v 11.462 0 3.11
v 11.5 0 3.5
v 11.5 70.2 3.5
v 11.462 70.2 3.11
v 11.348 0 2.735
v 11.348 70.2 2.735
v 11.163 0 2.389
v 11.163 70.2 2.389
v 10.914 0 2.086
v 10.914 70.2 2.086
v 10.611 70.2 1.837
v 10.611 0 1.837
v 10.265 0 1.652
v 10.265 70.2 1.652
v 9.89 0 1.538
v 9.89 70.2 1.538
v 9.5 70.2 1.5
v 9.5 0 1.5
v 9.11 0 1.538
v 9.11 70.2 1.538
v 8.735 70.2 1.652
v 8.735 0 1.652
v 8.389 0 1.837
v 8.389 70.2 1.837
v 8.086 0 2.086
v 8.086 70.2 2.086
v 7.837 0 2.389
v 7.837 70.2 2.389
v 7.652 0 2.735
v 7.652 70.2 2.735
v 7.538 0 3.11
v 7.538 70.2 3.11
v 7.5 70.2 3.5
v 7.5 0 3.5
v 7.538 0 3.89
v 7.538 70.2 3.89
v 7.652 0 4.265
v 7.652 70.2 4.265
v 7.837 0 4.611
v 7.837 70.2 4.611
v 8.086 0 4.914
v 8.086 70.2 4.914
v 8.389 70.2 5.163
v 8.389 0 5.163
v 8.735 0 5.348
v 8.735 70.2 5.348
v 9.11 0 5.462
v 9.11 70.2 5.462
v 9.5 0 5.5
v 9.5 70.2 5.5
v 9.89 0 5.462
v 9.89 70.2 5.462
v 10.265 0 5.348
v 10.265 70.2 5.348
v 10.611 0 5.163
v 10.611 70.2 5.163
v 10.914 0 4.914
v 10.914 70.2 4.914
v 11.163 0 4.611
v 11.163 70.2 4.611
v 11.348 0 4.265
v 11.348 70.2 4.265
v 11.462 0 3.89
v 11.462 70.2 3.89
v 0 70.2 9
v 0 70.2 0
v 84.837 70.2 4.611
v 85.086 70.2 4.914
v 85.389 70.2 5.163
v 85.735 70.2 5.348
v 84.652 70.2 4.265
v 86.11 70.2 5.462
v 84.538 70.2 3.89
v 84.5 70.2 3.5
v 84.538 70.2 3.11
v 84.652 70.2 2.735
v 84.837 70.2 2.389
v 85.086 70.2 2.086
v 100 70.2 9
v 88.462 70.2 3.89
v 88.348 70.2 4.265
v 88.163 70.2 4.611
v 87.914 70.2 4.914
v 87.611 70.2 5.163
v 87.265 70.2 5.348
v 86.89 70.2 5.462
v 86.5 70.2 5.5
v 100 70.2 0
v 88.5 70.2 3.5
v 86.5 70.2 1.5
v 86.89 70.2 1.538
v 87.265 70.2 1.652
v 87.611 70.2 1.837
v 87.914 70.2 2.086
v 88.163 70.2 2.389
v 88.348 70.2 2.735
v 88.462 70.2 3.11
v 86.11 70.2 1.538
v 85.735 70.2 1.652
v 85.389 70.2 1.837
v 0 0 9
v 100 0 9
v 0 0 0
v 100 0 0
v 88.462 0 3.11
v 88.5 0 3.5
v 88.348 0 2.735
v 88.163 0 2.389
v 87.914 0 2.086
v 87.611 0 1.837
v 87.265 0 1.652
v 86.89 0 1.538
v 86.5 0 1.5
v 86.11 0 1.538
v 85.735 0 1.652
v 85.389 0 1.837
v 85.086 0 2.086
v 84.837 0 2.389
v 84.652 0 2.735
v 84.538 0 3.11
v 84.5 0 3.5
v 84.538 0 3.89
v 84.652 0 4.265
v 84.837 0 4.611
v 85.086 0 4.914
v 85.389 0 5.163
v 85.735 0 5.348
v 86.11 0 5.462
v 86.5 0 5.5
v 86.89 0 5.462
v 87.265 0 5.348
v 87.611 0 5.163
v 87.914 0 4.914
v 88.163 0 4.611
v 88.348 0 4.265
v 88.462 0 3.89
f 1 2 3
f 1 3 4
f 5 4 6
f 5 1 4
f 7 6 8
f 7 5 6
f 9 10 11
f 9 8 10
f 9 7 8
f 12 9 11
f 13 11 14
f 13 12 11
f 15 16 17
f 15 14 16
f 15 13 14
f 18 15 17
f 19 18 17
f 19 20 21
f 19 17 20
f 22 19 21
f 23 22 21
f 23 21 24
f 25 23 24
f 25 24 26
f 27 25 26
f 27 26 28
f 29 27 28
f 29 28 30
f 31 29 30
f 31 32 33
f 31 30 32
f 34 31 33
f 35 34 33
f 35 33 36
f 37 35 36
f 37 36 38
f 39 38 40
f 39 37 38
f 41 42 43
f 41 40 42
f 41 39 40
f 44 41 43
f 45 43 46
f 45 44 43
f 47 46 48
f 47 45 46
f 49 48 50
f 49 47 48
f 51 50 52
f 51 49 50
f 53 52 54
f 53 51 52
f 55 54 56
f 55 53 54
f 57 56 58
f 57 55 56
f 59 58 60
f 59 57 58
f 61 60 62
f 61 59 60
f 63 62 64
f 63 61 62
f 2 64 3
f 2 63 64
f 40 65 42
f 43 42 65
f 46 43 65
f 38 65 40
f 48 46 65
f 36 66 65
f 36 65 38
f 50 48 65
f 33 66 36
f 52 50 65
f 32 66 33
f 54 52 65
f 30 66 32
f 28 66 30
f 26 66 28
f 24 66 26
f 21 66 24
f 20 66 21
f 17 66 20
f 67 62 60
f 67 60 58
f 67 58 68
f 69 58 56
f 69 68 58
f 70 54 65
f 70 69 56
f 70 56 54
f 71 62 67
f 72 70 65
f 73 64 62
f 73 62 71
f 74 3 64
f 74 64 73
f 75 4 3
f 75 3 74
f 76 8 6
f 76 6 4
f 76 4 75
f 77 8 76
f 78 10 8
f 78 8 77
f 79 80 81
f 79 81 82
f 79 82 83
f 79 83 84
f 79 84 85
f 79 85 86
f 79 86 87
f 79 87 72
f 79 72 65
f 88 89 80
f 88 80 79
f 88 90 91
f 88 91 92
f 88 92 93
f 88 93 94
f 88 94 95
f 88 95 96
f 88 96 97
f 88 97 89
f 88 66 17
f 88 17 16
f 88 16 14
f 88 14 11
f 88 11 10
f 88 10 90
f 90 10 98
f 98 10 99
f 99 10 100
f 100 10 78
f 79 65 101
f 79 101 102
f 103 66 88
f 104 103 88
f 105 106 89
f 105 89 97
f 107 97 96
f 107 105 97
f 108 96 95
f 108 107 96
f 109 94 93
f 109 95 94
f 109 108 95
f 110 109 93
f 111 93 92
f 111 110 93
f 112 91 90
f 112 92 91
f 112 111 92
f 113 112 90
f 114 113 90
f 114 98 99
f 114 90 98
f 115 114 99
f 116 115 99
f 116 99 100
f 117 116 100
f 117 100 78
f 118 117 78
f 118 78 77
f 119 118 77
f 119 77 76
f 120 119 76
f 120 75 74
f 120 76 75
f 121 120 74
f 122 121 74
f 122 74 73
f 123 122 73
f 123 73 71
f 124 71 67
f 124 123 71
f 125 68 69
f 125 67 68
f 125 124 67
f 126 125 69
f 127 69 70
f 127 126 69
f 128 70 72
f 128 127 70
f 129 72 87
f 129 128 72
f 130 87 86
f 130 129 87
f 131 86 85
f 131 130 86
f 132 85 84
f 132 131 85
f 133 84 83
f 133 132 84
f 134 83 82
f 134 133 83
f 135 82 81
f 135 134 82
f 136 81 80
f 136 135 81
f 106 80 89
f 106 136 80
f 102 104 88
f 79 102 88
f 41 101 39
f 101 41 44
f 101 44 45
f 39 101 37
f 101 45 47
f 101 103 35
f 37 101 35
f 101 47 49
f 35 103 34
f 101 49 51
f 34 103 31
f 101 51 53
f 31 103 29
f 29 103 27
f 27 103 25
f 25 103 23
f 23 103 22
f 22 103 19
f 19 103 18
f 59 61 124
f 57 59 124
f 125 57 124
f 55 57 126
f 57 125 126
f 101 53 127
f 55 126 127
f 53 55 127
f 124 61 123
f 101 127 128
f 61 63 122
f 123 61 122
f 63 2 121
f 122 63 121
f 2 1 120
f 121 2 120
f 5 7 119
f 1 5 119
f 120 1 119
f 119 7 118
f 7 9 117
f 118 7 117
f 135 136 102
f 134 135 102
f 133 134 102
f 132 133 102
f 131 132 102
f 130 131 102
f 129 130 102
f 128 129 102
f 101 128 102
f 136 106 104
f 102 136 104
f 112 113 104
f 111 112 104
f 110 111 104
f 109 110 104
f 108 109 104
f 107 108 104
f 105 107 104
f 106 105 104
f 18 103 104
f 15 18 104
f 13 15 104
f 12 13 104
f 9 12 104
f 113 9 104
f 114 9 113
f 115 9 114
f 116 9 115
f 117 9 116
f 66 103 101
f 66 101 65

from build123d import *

# Parameters (mm, degrees)
CYLINDER_R       = 2
CYLINDER_DEPTH   = 100
ARRAY002_X_COUNT = 2
ARRAY002_X_PITCH = 77
BOX004_W         = 100
BOX004_H         = 70.2
BOX004_DEPTH     = 9


with BuildPart() as hdd_side_hole_array:
    # Cylinder → Cylinder (new body)
    with BuildSketch(Plane(origin=(9.5, -16, 3.5), x_dir=(1, 0, 0), z_dir=(0, 1, 0))):
        Circle(CYLINDER_R)
    extrude(amount=CYLINDER_DEPTH)

    # Array002 X: hdd side hole array ×2


with BuildPart() as hdd_side_hole_array_1:
    add(hdd_side_hole_array.part)
    with Locations(*[(i * ARRAY002_X_PITCH, 0, 0) for i in range(1, ARRAY002_X_COUNT)]):
        add(hdd_side_hole_array.part)


with BuildPart() as hdd_with_holes_cut:
    # Box004 → Box004 (new body)
    with BuildSketch(Plane.XY):
        with Locations((50, 35.1)):
            Rectangle(BOX004_W, BOX004_H)
    extrude(amount=BOX004_DEPTH)

    # Cut003: cut hdd side hole array
    add(hdd_side_hole_array_1.part, mode=Mode.SUBTRACT)


solid = hdd_with_holes_cut.part
